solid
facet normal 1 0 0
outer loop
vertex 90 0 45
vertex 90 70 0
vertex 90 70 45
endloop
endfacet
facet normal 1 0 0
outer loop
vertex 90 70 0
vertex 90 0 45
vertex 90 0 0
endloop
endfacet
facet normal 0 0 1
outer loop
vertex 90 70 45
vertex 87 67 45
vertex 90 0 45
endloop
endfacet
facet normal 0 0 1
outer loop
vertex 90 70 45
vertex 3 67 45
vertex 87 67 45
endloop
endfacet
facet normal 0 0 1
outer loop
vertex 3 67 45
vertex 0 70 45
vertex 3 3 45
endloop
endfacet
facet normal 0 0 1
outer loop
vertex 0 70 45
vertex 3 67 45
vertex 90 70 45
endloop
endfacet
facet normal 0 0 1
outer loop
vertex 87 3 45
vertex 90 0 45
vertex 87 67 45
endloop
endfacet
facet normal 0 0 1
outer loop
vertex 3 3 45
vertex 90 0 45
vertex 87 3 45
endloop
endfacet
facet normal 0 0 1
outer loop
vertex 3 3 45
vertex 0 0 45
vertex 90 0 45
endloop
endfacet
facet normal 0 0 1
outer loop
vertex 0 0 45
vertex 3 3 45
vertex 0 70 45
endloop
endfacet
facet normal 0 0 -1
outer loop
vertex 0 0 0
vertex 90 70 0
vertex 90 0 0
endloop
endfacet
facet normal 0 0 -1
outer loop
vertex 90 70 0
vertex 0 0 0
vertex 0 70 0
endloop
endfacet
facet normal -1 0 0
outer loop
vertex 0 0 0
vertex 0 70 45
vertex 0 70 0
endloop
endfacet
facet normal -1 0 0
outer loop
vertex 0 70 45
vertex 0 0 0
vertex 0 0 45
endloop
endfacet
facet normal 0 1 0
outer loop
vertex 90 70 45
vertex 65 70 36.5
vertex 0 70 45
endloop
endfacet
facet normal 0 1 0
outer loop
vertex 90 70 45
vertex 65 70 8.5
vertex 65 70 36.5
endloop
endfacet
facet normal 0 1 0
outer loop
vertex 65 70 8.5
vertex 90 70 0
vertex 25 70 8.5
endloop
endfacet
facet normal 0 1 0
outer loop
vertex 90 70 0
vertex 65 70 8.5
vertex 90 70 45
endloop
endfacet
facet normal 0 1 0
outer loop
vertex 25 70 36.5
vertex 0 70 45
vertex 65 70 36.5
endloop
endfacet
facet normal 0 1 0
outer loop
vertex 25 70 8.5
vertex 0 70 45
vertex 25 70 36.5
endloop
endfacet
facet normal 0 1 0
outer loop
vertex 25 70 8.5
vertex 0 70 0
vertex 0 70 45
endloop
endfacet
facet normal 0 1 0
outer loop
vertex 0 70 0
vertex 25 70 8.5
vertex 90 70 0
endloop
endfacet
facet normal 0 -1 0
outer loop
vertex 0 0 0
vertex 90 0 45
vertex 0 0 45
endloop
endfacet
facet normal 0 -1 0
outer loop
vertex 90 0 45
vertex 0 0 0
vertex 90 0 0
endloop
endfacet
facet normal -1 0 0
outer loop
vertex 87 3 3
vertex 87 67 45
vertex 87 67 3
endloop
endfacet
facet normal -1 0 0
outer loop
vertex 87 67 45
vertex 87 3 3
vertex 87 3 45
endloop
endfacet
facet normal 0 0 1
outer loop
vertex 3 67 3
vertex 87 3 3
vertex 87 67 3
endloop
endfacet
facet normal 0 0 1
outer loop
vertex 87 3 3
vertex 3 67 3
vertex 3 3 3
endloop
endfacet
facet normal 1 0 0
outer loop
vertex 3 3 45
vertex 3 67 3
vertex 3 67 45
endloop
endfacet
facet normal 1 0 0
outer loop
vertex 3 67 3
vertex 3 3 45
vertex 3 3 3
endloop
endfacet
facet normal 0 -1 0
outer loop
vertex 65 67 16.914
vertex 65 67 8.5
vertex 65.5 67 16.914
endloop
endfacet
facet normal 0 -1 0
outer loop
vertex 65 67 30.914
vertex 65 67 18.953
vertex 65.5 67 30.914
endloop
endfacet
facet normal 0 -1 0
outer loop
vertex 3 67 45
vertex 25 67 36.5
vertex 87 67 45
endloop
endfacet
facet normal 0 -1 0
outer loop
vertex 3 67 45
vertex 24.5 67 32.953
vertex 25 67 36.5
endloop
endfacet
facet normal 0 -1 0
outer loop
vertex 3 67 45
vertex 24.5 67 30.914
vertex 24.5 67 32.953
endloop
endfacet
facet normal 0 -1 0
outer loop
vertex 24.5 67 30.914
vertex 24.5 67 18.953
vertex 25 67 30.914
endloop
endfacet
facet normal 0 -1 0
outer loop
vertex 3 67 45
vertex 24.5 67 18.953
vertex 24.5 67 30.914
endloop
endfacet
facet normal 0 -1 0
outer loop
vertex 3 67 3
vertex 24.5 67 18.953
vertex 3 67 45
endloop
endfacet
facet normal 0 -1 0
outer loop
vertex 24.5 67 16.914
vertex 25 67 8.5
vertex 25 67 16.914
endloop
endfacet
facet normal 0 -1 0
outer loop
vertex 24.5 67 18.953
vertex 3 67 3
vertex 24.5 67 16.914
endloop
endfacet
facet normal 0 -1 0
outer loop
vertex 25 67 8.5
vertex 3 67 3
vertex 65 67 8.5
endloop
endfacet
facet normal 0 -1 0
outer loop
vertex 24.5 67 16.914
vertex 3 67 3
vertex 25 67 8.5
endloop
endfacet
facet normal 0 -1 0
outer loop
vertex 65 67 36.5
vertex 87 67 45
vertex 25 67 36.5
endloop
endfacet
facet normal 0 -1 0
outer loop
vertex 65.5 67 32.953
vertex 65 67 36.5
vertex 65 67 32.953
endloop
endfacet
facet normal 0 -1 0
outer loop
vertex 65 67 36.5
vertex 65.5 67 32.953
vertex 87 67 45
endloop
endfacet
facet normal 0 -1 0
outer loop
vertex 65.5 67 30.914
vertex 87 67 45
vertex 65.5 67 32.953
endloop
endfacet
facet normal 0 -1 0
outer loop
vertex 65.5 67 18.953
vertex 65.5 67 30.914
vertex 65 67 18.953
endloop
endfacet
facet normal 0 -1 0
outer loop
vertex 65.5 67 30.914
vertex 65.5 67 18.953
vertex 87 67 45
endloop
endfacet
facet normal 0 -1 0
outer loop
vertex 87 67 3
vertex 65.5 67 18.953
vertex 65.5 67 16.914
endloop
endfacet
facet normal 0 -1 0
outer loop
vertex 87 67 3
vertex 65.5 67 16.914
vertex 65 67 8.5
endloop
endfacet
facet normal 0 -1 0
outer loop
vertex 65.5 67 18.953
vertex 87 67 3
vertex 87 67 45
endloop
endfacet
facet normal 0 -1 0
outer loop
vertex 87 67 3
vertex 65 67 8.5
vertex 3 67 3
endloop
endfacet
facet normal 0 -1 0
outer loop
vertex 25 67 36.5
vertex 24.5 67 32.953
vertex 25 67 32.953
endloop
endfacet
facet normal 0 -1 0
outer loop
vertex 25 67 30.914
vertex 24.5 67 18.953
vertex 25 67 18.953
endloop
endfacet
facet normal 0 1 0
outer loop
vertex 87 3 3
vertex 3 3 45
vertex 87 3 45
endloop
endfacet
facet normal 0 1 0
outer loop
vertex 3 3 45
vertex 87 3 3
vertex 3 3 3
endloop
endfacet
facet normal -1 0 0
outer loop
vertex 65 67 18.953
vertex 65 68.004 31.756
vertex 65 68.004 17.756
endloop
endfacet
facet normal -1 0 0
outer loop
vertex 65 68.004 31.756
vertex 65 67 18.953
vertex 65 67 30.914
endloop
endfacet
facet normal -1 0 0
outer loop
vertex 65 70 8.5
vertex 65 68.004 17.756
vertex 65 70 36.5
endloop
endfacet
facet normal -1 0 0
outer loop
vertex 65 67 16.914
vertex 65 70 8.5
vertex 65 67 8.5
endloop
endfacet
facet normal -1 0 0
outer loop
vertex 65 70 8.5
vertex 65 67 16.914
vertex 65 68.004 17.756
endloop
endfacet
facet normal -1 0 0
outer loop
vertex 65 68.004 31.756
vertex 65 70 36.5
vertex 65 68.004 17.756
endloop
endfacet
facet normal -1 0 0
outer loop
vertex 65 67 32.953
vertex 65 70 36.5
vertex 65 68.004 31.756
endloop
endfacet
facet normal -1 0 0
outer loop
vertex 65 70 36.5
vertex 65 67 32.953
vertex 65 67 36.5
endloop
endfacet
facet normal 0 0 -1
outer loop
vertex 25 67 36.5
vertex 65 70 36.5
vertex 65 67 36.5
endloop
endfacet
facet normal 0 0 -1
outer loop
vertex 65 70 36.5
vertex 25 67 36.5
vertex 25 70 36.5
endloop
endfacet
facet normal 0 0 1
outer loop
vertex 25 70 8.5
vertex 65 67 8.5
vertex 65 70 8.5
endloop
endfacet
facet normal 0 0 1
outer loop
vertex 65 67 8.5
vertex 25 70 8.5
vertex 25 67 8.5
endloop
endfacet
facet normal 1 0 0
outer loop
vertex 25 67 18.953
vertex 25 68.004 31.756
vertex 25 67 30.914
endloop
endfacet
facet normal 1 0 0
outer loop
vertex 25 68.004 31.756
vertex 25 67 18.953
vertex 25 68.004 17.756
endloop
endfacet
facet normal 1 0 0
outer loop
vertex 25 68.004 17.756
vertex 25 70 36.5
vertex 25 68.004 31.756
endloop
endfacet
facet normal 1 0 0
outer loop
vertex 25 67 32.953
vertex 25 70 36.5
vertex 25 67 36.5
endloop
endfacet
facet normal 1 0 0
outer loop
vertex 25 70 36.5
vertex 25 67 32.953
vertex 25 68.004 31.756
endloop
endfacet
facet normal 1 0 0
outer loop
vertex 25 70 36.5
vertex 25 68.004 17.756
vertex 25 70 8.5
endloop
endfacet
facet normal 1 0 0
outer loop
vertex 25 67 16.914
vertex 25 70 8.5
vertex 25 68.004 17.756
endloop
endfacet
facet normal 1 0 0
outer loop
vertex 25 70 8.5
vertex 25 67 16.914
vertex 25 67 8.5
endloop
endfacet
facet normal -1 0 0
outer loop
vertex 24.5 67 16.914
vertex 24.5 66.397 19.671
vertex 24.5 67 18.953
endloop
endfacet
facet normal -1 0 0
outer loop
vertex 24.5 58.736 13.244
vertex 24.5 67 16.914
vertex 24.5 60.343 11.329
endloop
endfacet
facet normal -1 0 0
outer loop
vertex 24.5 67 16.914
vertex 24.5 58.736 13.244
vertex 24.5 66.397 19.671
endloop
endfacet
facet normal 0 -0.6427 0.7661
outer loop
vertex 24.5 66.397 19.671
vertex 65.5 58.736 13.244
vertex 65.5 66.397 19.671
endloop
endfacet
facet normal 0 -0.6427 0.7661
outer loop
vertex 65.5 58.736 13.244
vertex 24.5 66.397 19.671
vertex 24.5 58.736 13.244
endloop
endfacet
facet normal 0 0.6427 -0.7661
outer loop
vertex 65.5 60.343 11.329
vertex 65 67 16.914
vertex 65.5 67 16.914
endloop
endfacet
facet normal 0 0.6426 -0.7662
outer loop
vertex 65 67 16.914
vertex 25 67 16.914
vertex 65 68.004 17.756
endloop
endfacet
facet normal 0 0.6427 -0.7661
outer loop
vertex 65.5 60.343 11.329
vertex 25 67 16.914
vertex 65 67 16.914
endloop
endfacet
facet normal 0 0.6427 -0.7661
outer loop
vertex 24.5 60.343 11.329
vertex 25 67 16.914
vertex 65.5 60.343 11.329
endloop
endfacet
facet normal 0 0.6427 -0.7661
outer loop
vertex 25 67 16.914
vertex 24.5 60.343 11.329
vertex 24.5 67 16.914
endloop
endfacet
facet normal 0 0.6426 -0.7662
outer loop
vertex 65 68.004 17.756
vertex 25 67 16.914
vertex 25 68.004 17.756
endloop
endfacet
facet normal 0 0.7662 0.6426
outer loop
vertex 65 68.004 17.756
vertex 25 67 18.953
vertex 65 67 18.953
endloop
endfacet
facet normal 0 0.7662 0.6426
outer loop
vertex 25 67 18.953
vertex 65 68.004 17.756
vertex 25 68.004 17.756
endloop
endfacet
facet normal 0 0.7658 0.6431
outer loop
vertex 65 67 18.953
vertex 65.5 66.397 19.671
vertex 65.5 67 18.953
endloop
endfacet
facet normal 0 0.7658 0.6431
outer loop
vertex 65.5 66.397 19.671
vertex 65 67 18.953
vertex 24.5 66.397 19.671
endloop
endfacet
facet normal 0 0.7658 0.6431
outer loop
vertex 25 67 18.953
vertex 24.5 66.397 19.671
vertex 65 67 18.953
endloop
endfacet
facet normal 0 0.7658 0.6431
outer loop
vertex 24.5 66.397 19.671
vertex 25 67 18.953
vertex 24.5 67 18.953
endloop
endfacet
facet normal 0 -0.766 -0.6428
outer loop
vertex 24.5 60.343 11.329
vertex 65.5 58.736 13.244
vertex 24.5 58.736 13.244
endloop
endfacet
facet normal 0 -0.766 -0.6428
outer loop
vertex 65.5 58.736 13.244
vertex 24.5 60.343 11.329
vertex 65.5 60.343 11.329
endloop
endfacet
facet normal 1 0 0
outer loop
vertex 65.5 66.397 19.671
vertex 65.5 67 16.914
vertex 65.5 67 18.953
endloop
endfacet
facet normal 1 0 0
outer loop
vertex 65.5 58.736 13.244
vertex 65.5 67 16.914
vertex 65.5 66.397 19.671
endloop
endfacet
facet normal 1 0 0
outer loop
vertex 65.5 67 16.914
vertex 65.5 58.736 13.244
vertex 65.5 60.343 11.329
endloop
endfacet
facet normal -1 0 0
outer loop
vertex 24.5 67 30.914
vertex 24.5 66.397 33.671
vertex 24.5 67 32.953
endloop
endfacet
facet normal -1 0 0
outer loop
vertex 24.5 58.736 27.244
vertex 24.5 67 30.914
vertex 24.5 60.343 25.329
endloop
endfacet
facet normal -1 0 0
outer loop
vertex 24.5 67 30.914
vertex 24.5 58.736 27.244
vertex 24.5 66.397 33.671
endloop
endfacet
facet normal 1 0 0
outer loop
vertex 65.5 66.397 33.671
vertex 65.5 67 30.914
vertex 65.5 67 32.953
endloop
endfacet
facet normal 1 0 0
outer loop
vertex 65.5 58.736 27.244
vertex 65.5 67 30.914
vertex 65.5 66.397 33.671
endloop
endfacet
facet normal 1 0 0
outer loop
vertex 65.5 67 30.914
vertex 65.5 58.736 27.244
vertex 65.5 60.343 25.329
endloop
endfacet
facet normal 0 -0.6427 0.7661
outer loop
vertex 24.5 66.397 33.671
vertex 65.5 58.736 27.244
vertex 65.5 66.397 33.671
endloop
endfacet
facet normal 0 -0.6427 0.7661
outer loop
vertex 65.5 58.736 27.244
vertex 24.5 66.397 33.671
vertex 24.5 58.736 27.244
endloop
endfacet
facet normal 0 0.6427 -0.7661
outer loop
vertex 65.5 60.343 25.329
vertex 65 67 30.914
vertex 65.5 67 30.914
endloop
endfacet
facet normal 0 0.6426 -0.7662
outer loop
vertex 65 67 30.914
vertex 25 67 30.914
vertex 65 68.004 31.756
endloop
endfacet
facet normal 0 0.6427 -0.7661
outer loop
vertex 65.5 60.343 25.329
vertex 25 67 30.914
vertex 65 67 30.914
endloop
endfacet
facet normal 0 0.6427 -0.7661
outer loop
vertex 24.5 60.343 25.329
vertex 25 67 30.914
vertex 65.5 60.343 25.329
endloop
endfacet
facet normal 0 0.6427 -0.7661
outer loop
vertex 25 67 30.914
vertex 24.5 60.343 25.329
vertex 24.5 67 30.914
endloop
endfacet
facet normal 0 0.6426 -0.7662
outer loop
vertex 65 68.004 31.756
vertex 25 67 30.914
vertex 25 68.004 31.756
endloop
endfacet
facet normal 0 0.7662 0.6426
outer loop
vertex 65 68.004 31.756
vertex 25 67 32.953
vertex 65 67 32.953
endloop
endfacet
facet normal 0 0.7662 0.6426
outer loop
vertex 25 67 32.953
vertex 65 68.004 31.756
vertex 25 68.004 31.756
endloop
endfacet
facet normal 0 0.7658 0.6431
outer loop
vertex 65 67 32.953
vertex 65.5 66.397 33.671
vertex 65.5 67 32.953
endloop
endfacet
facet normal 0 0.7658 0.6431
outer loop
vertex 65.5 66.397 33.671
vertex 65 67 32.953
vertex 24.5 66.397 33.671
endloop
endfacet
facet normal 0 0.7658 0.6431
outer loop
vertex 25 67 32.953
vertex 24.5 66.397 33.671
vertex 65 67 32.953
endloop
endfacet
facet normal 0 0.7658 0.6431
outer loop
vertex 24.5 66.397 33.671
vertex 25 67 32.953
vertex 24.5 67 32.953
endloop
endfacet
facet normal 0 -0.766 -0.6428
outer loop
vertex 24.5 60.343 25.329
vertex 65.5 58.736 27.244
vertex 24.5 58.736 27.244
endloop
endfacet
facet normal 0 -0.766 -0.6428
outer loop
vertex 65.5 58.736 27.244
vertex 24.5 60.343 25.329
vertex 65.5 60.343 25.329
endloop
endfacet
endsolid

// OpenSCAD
$fn = 32;

// ----------------------------------------------------------------------
// Vent box: louvers enclosure
// ----------------------------------------------------------------------

// --- parameters (mm) ---
box_l = 90;               // box length, X
box_w = 70;               // box width, Y
box_h = 45;               // box height, Z
wall_t = 3;               // shell wall thickness
win_l = 40;               // vent window width, X
win_h = 28;               // vent window height, Z
slat_t = 2.5;             // louver slat thickness
slat_d = 10;              // louver slat depth
slat_a = 40;              // louver slat angle, degrees
slat_pitch = 14;          // louver pitch
slat_yc = 63.37;          // slat centreline Y
fit_tol = 0.02;           // tolerance for press fits, mm
free_tol = 0.2;           // tolerance for clearance fits, mm

win_z0 = (box_h - win_h) / 2;  // window lower edge Z
n_slats = 2;  // louver count
slat_z0 = win_z0 + (win_h - (n_slats - 1) * slat_pitch) / 2;

difference() {
  union() {
    difference() {
      cube([box_l, box_w, box_h]);
  translate([wall_t, wall_t, wall_t])
    cube([box_l - 2 * wall_t, box_w - 2 * wall_t, box_h]);
  translate([(box_l - win_l) / 2, box_w - wall_t - 1, win_z0])
    cube([win_l, wall_t + 2, win_h]);
    }
    for (i = [0 : n_slats - 1])
      translate([box_l / 2, slat_yc, slat_z0 + i * slat_pitch])
        rotate([slat_a, 0, 0])
          cube([win_l + 1, slat_d, slat_t], center = true);
  }
}
